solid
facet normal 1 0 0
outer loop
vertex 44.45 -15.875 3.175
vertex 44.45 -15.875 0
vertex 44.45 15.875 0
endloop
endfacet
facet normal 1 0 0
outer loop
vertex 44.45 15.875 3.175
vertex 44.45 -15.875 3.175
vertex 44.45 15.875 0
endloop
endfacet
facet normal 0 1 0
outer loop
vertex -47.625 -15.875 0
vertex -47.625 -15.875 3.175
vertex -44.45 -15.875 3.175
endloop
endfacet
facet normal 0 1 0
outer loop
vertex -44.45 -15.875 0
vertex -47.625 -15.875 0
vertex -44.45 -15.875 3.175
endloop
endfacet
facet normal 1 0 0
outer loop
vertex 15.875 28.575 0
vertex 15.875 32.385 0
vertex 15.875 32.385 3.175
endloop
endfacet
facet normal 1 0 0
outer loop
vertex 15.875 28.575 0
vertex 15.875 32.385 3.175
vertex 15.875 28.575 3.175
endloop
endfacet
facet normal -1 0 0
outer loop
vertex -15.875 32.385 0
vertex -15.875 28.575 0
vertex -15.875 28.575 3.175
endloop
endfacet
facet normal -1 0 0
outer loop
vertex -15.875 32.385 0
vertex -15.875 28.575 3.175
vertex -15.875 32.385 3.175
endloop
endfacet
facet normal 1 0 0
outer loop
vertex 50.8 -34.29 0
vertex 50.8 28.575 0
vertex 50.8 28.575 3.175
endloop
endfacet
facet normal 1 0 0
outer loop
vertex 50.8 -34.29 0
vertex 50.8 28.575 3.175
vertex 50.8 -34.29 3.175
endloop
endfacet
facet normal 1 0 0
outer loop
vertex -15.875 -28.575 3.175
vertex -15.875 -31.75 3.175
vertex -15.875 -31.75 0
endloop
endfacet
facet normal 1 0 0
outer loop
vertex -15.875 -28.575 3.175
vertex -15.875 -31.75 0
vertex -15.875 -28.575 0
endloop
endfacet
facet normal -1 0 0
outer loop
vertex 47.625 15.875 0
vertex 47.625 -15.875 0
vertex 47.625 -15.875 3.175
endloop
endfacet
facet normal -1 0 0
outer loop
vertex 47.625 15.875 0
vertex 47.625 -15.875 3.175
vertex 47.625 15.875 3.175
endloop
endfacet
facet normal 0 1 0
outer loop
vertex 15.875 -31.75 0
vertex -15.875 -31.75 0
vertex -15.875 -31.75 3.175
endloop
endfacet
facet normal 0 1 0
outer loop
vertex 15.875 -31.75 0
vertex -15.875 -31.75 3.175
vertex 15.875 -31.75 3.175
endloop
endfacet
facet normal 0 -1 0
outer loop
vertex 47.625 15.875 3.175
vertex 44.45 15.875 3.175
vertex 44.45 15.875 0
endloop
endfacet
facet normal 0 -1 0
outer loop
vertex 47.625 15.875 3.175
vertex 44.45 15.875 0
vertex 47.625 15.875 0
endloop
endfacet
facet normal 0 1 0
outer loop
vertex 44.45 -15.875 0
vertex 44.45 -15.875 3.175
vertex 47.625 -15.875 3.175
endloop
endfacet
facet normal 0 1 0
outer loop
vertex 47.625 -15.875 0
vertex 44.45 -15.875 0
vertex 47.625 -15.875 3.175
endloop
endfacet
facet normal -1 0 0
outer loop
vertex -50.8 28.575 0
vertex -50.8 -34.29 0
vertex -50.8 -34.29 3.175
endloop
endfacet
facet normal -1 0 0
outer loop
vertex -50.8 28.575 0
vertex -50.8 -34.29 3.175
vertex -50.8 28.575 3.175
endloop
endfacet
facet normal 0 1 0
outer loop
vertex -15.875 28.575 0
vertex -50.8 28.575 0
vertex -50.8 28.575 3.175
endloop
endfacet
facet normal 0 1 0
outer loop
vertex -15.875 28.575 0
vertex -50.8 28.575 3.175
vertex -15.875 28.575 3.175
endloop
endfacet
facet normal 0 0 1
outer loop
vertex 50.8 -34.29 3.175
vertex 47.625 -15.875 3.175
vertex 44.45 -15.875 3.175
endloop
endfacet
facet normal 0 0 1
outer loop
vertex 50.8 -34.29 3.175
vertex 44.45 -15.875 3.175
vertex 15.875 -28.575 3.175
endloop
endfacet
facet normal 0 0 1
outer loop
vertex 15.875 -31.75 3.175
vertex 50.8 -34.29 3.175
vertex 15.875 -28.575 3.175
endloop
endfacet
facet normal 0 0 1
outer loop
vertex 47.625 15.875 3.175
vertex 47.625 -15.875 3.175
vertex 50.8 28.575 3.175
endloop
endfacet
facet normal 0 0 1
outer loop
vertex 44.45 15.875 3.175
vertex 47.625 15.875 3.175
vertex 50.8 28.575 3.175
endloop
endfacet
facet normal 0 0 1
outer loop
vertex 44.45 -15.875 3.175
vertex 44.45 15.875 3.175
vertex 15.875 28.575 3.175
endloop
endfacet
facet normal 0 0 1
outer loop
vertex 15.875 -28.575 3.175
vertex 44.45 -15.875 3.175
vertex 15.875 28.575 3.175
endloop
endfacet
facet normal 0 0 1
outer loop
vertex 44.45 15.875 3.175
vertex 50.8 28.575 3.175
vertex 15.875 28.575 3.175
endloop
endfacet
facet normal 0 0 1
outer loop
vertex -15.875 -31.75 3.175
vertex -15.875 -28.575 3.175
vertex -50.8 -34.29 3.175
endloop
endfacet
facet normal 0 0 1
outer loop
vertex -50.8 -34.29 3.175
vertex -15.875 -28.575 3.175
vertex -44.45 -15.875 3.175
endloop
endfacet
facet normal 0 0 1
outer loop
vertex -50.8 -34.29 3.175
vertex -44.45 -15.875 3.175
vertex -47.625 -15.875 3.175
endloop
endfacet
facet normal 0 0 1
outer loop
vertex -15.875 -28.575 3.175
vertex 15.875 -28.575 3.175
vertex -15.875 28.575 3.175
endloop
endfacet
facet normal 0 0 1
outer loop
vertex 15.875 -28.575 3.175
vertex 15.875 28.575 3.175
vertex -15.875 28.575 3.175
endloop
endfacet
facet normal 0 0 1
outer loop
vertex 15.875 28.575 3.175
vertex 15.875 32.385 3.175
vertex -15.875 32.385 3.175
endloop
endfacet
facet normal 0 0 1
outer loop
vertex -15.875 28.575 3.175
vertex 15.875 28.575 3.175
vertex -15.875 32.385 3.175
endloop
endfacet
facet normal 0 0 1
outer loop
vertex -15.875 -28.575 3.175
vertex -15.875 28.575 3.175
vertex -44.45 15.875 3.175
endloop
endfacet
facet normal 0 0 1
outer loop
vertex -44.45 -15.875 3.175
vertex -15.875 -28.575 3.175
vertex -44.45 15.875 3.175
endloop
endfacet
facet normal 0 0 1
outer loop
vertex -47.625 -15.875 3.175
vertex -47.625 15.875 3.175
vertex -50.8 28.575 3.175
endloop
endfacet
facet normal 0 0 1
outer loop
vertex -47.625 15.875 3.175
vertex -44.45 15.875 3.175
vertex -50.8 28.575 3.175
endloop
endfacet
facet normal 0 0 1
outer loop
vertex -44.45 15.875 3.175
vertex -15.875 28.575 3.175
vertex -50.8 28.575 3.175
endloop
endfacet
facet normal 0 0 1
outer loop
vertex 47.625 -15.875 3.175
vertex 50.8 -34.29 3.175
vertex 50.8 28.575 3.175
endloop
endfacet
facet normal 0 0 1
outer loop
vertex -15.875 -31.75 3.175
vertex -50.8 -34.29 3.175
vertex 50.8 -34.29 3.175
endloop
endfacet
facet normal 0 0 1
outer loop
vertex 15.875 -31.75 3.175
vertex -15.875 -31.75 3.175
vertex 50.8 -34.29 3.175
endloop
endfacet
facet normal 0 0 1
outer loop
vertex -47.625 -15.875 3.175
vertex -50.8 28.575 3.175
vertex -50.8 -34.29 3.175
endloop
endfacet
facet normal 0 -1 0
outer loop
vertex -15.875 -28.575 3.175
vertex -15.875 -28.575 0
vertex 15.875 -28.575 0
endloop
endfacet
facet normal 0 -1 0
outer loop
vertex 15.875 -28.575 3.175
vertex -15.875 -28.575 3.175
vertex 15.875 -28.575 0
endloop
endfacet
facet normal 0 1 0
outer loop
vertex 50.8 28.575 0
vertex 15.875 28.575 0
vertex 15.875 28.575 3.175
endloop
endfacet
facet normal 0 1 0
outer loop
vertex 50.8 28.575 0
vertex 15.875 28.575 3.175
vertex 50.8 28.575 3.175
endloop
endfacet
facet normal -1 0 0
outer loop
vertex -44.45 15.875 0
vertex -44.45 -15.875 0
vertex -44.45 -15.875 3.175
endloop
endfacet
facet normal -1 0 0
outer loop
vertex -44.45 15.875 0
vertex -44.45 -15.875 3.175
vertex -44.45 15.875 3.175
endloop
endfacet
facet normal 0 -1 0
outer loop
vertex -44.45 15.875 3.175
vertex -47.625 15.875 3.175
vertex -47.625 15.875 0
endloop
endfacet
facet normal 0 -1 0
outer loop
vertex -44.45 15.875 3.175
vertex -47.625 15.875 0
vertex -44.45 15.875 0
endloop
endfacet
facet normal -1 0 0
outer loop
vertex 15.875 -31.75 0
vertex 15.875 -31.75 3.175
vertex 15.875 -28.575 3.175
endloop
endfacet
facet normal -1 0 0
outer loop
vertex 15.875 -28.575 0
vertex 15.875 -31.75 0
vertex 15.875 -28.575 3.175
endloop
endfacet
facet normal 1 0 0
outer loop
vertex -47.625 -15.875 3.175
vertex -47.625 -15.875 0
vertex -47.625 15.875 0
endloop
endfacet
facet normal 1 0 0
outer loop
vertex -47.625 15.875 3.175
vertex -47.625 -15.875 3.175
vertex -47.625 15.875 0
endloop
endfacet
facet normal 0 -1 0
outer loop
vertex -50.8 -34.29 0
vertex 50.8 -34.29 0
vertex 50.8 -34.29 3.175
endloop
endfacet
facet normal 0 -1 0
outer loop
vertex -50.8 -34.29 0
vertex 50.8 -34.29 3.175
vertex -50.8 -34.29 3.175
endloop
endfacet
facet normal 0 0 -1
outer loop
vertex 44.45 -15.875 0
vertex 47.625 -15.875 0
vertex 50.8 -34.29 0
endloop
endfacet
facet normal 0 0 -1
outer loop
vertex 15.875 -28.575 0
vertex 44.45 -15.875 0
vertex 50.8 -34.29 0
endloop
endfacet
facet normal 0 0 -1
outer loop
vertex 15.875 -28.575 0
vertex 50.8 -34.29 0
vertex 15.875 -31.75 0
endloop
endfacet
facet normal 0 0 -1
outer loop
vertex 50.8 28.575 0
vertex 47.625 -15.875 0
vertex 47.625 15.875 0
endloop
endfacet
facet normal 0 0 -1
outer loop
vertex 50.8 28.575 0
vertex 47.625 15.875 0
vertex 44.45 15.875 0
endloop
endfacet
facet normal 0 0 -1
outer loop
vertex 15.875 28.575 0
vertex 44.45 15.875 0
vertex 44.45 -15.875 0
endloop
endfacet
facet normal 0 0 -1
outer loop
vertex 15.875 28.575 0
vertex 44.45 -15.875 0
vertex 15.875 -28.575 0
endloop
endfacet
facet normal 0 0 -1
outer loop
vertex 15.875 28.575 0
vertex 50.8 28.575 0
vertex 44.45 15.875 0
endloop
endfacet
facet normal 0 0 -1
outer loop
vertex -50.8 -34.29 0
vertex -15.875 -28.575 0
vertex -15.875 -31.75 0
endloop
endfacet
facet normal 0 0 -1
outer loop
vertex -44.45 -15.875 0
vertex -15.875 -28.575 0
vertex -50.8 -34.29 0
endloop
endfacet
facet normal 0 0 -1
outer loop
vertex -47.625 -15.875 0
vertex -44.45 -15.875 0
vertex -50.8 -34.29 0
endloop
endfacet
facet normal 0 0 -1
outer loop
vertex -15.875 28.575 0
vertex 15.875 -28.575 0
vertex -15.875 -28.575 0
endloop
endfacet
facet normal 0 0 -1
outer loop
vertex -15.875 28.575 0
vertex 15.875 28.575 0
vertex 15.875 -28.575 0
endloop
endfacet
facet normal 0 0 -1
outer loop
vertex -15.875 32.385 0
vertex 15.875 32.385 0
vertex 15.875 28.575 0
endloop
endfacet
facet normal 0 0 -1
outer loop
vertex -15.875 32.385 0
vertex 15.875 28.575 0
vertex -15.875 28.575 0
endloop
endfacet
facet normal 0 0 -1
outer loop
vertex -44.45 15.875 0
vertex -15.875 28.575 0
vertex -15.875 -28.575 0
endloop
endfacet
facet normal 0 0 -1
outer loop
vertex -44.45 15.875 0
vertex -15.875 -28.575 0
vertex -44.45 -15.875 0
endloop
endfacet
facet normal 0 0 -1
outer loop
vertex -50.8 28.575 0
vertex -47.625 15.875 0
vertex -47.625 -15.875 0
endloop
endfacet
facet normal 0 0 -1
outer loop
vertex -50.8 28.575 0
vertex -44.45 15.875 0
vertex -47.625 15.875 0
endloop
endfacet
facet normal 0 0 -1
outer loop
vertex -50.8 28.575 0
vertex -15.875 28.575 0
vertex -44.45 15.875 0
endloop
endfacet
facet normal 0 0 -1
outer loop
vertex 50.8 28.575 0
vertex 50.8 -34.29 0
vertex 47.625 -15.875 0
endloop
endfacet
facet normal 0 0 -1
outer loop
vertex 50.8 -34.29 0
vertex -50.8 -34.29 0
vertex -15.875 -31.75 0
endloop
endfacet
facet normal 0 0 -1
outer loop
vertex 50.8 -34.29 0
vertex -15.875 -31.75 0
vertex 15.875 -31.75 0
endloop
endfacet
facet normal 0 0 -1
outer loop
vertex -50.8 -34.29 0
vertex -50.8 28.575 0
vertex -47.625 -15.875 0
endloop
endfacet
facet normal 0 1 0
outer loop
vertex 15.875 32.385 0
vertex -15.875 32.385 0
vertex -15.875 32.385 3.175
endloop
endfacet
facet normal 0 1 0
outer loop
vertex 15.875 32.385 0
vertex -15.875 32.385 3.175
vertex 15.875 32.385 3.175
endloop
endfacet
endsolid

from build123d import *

# Parameters (mm, degrees)
SKETCH1_W           = 31.75
SKETCH1_H           = 3.175
SKETCH1_W_2         = 3.175
SKETCH1_H_2         = 31.75
BOSS_EXTRUDE1_DEPTH = 3.175


with BuildPart() as part:
    # Sketch1 → Boss-Extrude1 (new body)
    with BuildSketch(Plane.XY):
        Polygon((-50.8, 28.575), (-15.875, 28.575), (-15.875, 32.385), (15.875, 32.385), (15.875, 28.575), (50.8, 28.575), (50.8, -34.29), (-50.8, -34.29), align=None)
        with Locations((0, -30.1625)):
            Rectangle(SKETCH1_W, SKETCH1_H, mode=Mode.SUBTRACT)
        with Locations((-46.0375, 0)):
            Rectangle(SKETCH1_W_2, SKETCH1_H_2, mode=Mode.SUBTRACT)
        with Locations((46.0375, 0)):
            Rectangle(SKETCH1_W_2, SKETCH1_H_2, mode=Mode.SUBTRACT)
    extrude(amount=BOSS_EXTRUDE1_DEPTH)


solid = part.part
